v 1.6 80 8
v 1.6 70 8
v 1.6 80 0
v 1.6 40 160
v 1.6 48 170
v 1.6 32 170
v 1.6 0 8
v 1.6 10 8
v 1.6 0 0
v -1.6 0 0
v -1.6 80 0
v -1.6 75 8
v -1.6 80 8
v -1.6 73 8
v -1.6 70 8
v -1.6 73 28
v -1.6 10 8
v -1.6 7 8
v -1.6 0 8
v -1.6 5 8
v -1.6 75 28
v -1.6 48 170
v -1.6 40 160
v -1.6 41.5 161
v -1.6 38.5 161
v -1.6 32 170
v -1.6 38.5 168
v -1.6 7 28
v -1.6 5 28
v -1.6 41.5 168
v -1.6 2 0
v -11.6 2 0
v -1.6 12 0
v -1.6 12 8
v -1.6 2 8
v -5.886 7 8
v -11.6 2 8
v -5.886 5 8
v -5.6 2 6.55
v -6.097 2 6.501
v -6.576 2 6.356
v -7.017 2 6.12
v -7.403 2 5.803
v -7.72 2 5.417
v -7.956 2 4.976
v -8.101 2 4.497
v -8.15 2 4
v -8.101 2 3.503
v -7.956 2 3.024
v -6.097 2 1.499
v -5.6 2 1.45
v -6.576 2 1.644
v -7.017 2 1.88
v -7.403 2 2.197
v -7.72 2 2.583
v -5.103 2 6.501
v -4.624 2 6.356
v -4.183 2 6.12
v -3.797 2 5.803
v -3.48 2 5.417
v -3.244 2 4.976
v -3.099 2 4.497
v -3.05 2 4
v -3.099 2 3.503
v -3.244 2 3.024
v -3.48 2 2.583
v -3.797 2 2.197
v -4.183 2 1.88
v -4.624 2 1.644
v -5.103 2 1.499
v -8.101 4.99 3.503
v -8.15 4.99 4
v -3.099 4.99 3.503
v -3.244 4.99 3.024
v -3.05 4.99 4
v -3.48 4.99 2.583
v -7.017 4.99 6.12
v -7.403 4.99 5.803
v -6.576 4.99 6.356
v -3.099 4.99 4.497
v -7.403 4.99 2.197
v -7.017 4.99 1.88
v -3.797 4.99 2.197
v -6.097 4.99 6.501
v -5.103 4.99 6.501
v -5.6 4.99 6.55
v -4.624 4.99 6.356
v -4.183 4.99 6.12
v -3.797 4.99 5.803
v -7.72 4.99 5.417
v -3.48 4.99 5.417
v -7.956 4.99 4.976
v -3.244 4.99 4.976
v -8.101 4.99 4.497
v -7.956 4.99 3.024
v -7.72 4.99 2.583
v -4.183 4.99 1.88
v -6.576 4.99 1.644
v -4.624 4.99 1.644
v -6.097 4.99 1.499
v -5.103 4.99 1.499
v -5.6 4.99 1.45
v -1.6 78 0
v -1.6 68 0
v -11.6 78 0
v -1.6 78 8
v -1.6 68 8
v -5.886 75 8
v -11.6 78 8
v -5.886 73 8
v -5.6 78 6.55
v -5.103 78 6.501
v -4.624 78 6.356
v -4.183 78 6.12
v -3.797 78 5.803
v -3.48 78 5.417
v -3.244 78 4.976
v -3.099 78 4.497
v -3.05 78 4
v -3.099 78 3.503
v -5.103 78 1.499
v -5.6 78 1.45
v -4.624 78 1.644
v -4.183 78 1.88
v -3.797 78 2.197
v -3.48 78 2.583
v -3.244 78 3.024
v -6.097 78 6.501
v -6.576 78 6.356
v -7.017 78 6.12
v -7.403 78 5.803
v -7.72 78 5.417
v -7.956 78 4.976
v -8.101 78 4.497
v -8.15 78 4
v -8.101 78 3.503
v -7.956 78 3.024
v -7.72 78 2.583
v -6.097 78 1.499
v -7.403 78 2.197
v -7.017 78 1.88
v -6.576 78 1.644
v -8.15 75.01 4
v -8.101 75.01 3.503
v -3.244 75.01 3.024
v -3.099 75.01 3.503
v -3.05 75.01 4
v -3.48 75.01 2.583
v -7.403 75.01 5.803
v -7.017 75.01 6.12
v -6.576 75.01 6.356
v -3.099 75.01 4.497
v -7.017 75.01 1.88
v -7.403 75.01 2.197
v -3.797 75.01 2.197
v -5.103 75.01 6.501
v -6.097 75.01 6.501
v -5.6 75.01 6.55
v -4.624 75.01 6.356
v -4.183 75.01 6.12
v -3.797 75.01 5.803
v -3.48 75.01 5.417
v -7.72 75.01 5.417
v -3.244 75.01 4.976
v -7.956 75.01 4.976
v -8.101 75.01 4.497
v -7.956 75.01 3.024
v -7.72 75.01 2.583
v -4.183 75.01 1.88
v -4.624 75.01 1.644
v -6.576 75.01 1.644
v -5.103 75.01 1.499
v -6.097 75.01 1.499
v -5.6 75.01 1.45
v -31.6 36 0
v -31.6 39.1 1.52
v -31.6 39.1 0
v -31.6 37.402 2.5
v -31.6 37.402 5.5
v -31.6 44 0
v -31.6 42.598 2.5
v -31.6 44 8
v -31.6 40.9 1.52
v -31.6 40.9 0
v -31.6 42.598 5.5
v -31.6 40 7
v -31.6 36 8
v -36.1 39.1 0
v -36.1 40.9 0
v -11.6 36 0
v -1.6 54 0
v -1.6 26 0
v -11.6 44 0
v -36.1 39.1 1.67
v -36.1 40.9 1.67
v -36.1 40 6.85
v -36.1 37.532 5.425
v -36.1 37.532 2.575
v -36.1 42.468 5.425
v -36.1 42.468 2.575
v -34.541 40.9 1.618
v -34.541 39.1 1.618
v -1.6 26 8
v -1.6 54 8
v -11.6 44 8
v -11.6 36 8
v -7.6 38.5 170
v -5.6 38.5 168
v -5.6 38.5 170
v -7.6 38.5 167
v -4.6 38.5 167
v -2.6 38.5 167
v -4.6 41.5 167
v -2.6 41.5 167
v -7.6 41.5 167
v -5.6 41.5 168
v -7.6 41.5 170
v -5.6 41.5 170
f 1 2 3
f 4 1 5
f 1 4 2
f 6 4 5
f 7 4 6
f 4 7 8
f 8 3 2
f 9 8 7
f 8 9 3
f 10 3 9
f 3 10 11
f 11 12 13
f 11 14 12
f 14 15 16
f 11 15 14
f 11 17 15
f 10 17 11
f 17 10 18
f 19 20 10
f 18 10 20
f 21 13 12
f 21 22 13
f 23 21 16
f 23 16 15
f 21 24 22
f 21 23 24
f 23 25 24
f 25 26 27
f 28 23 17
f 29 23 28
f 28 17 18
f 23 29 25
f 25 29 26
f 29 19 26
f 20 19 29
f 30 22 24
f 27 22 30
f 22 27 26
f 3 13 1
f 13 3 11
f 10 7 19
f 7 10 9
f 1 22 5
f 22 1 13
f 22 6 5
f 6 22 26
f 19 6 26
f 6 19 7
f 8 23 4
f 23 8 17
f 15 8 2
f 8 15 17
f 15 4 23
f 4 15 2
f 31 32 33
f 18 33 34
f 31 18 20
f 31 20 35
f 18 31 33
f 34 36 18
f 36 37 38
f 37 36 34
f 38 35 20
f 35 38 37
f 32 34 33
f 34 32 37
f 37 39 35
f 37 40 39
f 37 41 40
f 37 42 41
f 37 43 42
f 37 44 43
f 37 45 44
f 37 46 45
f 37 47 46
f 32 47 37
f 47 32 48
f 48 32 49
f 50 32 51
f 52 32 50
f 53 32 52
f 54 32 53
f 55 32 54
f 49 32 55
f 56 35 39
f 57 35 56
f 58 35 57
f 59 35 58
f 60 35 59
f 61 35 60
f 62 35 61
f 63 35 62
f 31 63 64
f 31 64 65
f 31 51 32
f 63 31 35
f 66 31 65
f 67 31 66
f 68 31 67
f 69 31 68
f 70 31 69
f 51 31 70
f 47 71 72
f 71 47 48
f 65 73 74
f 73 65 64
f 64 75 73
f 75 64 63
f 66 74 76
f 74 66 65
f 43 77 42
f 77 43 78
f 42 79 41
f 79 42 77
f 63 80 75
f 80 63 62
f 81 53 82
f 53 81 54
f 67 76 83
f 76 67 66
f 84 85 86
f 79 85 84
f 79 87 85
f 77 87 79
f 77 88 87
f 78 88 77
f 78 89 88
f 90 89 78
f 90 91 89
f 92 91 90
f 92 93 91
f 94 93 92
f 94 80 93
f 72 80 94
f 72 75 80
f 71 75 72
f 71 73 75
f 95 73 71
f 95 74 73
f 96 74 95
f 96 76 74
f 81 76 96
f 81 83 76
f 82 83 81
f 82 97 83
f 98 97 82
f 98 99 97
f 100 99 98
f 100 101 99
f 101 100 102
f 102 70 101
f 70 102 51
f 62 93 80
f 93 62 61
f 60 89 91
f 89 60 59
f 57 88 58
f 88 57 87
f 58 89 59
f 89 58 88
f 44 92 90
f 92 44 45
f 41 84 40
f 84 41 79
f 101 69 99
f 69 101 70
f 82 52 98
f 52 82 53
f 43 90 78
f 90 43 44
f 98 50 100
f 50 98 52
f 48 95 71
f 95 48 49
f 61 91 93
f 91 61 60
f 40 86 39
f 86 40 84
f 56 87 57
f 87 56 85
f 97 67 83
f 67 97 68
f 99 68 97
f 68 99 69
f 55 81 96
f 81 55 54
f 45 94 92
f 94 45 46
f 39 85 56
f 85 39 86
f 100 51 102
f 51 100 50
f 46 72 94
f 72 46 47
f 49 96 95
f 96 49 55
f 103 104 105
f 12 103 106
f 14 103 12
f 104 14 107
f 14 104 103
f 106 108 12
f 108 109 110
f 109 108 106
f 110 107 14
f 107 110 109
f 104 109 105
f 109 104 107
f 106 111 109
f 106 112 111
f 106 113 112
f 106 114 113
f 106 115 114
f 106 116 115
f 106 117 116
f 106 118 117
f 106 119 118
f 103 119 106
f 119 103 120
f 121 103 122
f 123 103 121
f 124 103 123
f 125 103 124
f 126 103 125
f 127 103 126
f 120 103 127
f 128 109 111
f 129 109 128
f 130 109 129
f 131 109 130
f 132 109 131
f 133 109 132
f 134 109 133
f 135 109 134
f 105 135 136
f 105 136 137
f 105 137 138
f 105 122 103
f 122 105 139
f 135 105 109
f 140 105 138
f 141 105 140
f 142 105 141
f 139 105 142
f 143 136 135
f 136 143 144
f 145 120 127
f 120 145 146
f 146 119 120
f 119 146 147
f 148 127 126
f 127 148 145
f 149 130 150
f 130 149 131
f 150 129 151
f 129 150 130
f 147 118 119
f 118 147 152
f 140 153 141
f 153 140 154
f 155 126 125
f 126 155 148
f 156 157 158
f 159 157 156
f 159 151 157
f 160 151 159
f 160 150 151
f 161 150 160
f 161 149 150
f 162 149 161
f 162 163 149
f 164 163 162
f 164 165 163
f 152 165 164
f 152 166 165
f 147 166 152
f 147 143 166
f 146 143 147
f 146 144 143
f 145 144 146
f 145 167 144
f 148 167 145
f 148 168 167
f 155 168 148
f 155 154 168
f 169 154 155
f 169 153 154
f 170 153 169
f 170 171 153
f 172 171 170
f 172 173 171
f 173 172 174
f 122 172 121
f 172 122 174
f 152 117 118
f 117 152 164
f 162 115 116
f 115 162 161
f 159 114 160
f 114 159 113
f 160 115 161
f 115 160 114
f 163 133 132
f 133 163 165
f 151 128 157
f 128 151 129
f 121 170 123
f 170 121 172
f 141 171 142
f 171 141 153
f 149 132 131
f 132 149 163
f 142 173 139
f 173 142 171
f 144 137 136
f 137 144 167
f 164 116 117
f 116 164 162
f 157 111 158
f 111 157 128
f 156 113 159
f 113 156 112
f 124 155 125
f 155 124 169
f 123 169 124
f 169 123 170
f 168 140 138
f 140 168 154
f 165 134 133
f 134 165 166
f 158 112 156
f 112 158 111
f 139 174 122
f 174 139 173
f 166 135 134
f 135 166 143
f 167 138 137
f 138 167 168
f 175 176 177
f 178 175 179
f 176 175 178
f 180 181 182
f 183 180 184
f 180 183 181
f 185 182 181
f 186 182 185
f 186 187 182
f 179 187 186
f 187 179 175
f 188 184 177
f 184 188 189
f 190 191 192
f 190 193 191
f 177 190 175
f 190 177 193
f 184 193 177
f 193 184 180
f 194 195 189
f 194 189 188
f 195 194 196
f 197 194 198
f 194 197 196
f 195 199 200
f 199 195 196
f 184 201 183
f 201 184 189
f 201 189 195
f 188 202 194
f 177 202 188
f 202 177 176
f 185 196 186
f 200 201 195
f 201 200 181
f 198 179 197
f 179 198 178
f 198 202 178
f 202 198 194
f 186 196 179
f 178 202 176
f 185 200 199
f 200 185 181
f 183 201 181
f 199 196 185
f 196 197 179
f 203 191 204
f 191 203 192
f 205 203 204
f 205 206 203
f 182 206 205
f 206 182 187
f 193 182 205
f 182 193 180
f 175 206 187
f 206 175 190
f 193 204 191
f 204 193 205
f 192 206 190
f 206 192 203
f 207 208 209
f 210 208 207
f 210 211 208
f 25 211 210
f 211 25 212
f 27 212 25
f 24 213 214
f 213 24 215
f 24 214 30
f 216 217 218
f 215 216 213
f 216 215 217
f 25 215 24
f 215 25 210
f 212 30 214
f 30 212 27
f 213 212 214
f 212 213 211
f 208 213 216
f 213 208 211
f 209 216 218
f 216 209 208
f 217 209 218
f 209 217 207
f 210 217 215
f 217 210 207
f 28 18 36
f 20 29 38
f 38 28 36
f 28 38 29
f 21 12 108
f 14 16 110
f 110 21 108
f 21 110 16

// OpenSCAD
// file: ffp2_drying_rack.scad
/*

  ffp2_drying_rack.scad

  (c) olikraus@gmail.com

  This work is licensed under the Creative Commons Attribution-NonCommercial-ShareAlike 4.0 International License. 
  To view a copy of this license, visit http://creativecommons.org/licenses/by-nc-sa/4.0/.
    
*/


$fn=32;

wall_thickness=3.2;
wall_height=170;
wall_width=80;


clip_len=40;
clip_height=8;
clip_thickness=2;
clip_diameter = clip_height-3;
clip_cylinder_len = 2.5;

/* min 8 for clip_cyllinder_len=2.5 
    also depends on clip_diameter and in turn on clip_height
    clip_triangle_len must be also larger than press_fit_len
*/
clip_triangle_len = 10;

/* clip hole diameter extention, so that the clip fits better */
clip_diameter_gap = 0.1; 


hook_len=6;
hook_nose_height=3;
hook_nose_width=2;
hook_thickness=3;

press_fit_len=5;
press_fit_diameter=clip_height-2;


module triangle_block() {
    linear_extrude(height=clip_height)
    polygon(points=[[0,0],[clip_triangle_len,0],[0,clip_triangle_len]]);
}

module wall_support() {
  translate([0,clip_thickness,0])
  rotate([90,0,0])
  linear_extrude(height=clip_thickness)
  polygon(points=[[0,0],[clip_triangle_len*3/7,0],[0,clip_triangle_len*2]]);
}

module clip_m() {
    union() {
        translate([0,clip_thickness,0])
        triangle_block();
        cube([clip_len, clip_thickness,clip_height]);
        translate([clip_len-(clip_height)/2,clip_thickness,clip_height/2])
        rotate([-90,0,0])
        difference() {
            cylinder(d=clip_diameter, h=clip_cylinder_len);
            translate([0,(clip_diameter)/2,0])
            rotate([-38,0,0])
            translate([-clip_height/2, -clip_height, 0])
            cube([clip_height,clip_height,clip_height]);
        }
    }
}


module clip_f() {
    translate([0,clip_thickness,0])
    difference() {
        rotate([0,0,90])
        triangle_block();
        translate([-clip_height/2,-0.01,clip_height/2])
        rotate([-90,0,0])
        cylinder(d=clip_diameter+clip_diameter_gap, 
                h=clip_cylinder_len+0.5);
    }
}

module hook() {
    rotate([-90,0,0])
    linear_extrude(height=hook_thickness, center=true)
    polygon(points=[
        [0,-1],
        [1,0],
        [hook_len-hook_nose_width-1,0],
        [hook_len-hook_nose_width,-1],
        [hook_len-hook_nose_width,-hook_nose_height],
        [hook_len,-hook_nose_height],
        [hook_len,0],
        [0,hook_len]]);
}

module press_fit_f() {
    difference() {
        translate([0,-clip_height/2,0])
        cube([clip_triangle_len, clip_height, clip_height]);
        
        translate([clip_triangle_len-press_fit_len,
            -press_fit_diameter/3/2,
            -0.01])
        cube([press_fit_len+0.01,press_fit_diameter/3,clip_height/2]);
        

        translate([clip_triangle_len-press_fit_len,0,clip_height/2])
        rotate([0,90,0])
        cylinder(d=press_fit_diameter,h=press_fit_len+0.01, $fn=64);
    }

    translate([0,clip_height/2,0])
    triangle_block();

    mirror([0,1,0])
    translate([0,clip_height/2,0])
    triangle_block();
}

module press_fit_m() {

    translate([-clip_len+clip_triangle_len,0,0])
    union() {
        translate([0.5-press_fit_len,-(press_fit_diameter/3-0.2)/2,0])
        cube([press_fit_len-0.5,press_fit_diameter/3-0.2,clip_height/2]);
        
        translate([0,0,clip_height/2])
        rotate([0,-90,0])
        cylinder(
            d1=press_fit_diameter, 
            d2=press_fit_diameter*0.95, 
            h=press_fit_len-0.5, $fn=6);
        
        translate([0,-clip_height/2,0])
        cube([clip_len-clip_triangle_len, clip_height, clip_height]);
        
        translate([clip_len-clip_triangle_len,clip_height/2,0])
        mirror([1,0,0])
        triangle_block();

        translate([clip_len-clip_triangle_len,-clip_height/2,0])
        rotate([0,0,180])
        triangle_block();
        
    }
}

module pure_wall() {
    difference() {
        union() {
            translate([-wall_thickness/2,0,0])
            cube([wall_thickness, wall_width, clip_height]);

            translate([wall_thickness/2,0,clip_height])
            rotate([0,-90,0])
            linear_extrude(height=wall_thickness)
            polygon(points=[
                [0,0],
                [0,wall_width],
                [wall_height-clip_height,wall_width/2+clip_height],
                [wall_height-clip_height,wall_width/2-clip_height]
            ]);


            
        }

        translate([wall_thickness,0,clip_height])
        rotate([0,-90,0])
        linear_extrude(height=wall_thickness*2)
        polygon(points=[
        [0,clip_triangle_len],
        [0,wall_width-clip_triangle_len],
        [wall_height-clip_height-clip_triangle_len,wall_width/2]
        ]);
    }
    
}


module wall(is_left=1, is_right=1) {
    union() {
        //translate([-wall_thickness/2,0,0])
        //cube([wall_thickness, wall_width, wall_height]);
        pure_wall();
        if ( is_right) {
            translate([wall_thickness/2,0,0])
            clip_m();

            translate([wall_thickness/2,wall_width,0])
            mirror([0,1,0])
            clip_m();

            translate([wall_thickness/2,wall_width/2,0])
            press_fit_f();
            
            translate([wall_thickness/2,
                    wall_width/2,
                    wall_height-hook_nose_height])            
            hook();
	    
            translate([wall_thickness/2,clip_thickness*2.5,clip_height])
	    wall_support();

            translate([wall_thickness/2,wall_width-clip_thickness*3.5,clip_height])
	    wall_support();

        }

        if ( is_left) {

            translate([-wall_thickness/2,0,0])
            clip_f();

            translate([-wall_thickness/2,wall_width,0])
            mirror([0,1,0])
            clip_f();
            
            translate([-wall_thickness/2,wall_width/2,0])
            press_fit_m();
            
            mirror([1,0,0])
            translate([wall_thickness/2,
                    wall_width/2,
                    wall_height-hook_nose_height])
            hook();

            mirror([1,0,0])
            translate([wall_thickness/2,clip_thickness*2.5,clip_height])
	    wall_support();

            mirror([1,0,0])
            translate([wall_thickness/2,wall_width-clip_thickness*3.5,clip_height])
	    wall_support();

        }
    }
}


//wall(1,1);
// main file
/*

  left.scad

  (c) olikraus@gmail.com

  This work is licensed under the Creative Commons Attribution-NonCommercial-ShareAlike 4.0 International License. 
  To view a copy of this license, visit http://creativecommons.org/licenses/by-nc-sa/4.0/.
    
*/
include <ffp2_drying_rack.scad>

wall(1,0);
